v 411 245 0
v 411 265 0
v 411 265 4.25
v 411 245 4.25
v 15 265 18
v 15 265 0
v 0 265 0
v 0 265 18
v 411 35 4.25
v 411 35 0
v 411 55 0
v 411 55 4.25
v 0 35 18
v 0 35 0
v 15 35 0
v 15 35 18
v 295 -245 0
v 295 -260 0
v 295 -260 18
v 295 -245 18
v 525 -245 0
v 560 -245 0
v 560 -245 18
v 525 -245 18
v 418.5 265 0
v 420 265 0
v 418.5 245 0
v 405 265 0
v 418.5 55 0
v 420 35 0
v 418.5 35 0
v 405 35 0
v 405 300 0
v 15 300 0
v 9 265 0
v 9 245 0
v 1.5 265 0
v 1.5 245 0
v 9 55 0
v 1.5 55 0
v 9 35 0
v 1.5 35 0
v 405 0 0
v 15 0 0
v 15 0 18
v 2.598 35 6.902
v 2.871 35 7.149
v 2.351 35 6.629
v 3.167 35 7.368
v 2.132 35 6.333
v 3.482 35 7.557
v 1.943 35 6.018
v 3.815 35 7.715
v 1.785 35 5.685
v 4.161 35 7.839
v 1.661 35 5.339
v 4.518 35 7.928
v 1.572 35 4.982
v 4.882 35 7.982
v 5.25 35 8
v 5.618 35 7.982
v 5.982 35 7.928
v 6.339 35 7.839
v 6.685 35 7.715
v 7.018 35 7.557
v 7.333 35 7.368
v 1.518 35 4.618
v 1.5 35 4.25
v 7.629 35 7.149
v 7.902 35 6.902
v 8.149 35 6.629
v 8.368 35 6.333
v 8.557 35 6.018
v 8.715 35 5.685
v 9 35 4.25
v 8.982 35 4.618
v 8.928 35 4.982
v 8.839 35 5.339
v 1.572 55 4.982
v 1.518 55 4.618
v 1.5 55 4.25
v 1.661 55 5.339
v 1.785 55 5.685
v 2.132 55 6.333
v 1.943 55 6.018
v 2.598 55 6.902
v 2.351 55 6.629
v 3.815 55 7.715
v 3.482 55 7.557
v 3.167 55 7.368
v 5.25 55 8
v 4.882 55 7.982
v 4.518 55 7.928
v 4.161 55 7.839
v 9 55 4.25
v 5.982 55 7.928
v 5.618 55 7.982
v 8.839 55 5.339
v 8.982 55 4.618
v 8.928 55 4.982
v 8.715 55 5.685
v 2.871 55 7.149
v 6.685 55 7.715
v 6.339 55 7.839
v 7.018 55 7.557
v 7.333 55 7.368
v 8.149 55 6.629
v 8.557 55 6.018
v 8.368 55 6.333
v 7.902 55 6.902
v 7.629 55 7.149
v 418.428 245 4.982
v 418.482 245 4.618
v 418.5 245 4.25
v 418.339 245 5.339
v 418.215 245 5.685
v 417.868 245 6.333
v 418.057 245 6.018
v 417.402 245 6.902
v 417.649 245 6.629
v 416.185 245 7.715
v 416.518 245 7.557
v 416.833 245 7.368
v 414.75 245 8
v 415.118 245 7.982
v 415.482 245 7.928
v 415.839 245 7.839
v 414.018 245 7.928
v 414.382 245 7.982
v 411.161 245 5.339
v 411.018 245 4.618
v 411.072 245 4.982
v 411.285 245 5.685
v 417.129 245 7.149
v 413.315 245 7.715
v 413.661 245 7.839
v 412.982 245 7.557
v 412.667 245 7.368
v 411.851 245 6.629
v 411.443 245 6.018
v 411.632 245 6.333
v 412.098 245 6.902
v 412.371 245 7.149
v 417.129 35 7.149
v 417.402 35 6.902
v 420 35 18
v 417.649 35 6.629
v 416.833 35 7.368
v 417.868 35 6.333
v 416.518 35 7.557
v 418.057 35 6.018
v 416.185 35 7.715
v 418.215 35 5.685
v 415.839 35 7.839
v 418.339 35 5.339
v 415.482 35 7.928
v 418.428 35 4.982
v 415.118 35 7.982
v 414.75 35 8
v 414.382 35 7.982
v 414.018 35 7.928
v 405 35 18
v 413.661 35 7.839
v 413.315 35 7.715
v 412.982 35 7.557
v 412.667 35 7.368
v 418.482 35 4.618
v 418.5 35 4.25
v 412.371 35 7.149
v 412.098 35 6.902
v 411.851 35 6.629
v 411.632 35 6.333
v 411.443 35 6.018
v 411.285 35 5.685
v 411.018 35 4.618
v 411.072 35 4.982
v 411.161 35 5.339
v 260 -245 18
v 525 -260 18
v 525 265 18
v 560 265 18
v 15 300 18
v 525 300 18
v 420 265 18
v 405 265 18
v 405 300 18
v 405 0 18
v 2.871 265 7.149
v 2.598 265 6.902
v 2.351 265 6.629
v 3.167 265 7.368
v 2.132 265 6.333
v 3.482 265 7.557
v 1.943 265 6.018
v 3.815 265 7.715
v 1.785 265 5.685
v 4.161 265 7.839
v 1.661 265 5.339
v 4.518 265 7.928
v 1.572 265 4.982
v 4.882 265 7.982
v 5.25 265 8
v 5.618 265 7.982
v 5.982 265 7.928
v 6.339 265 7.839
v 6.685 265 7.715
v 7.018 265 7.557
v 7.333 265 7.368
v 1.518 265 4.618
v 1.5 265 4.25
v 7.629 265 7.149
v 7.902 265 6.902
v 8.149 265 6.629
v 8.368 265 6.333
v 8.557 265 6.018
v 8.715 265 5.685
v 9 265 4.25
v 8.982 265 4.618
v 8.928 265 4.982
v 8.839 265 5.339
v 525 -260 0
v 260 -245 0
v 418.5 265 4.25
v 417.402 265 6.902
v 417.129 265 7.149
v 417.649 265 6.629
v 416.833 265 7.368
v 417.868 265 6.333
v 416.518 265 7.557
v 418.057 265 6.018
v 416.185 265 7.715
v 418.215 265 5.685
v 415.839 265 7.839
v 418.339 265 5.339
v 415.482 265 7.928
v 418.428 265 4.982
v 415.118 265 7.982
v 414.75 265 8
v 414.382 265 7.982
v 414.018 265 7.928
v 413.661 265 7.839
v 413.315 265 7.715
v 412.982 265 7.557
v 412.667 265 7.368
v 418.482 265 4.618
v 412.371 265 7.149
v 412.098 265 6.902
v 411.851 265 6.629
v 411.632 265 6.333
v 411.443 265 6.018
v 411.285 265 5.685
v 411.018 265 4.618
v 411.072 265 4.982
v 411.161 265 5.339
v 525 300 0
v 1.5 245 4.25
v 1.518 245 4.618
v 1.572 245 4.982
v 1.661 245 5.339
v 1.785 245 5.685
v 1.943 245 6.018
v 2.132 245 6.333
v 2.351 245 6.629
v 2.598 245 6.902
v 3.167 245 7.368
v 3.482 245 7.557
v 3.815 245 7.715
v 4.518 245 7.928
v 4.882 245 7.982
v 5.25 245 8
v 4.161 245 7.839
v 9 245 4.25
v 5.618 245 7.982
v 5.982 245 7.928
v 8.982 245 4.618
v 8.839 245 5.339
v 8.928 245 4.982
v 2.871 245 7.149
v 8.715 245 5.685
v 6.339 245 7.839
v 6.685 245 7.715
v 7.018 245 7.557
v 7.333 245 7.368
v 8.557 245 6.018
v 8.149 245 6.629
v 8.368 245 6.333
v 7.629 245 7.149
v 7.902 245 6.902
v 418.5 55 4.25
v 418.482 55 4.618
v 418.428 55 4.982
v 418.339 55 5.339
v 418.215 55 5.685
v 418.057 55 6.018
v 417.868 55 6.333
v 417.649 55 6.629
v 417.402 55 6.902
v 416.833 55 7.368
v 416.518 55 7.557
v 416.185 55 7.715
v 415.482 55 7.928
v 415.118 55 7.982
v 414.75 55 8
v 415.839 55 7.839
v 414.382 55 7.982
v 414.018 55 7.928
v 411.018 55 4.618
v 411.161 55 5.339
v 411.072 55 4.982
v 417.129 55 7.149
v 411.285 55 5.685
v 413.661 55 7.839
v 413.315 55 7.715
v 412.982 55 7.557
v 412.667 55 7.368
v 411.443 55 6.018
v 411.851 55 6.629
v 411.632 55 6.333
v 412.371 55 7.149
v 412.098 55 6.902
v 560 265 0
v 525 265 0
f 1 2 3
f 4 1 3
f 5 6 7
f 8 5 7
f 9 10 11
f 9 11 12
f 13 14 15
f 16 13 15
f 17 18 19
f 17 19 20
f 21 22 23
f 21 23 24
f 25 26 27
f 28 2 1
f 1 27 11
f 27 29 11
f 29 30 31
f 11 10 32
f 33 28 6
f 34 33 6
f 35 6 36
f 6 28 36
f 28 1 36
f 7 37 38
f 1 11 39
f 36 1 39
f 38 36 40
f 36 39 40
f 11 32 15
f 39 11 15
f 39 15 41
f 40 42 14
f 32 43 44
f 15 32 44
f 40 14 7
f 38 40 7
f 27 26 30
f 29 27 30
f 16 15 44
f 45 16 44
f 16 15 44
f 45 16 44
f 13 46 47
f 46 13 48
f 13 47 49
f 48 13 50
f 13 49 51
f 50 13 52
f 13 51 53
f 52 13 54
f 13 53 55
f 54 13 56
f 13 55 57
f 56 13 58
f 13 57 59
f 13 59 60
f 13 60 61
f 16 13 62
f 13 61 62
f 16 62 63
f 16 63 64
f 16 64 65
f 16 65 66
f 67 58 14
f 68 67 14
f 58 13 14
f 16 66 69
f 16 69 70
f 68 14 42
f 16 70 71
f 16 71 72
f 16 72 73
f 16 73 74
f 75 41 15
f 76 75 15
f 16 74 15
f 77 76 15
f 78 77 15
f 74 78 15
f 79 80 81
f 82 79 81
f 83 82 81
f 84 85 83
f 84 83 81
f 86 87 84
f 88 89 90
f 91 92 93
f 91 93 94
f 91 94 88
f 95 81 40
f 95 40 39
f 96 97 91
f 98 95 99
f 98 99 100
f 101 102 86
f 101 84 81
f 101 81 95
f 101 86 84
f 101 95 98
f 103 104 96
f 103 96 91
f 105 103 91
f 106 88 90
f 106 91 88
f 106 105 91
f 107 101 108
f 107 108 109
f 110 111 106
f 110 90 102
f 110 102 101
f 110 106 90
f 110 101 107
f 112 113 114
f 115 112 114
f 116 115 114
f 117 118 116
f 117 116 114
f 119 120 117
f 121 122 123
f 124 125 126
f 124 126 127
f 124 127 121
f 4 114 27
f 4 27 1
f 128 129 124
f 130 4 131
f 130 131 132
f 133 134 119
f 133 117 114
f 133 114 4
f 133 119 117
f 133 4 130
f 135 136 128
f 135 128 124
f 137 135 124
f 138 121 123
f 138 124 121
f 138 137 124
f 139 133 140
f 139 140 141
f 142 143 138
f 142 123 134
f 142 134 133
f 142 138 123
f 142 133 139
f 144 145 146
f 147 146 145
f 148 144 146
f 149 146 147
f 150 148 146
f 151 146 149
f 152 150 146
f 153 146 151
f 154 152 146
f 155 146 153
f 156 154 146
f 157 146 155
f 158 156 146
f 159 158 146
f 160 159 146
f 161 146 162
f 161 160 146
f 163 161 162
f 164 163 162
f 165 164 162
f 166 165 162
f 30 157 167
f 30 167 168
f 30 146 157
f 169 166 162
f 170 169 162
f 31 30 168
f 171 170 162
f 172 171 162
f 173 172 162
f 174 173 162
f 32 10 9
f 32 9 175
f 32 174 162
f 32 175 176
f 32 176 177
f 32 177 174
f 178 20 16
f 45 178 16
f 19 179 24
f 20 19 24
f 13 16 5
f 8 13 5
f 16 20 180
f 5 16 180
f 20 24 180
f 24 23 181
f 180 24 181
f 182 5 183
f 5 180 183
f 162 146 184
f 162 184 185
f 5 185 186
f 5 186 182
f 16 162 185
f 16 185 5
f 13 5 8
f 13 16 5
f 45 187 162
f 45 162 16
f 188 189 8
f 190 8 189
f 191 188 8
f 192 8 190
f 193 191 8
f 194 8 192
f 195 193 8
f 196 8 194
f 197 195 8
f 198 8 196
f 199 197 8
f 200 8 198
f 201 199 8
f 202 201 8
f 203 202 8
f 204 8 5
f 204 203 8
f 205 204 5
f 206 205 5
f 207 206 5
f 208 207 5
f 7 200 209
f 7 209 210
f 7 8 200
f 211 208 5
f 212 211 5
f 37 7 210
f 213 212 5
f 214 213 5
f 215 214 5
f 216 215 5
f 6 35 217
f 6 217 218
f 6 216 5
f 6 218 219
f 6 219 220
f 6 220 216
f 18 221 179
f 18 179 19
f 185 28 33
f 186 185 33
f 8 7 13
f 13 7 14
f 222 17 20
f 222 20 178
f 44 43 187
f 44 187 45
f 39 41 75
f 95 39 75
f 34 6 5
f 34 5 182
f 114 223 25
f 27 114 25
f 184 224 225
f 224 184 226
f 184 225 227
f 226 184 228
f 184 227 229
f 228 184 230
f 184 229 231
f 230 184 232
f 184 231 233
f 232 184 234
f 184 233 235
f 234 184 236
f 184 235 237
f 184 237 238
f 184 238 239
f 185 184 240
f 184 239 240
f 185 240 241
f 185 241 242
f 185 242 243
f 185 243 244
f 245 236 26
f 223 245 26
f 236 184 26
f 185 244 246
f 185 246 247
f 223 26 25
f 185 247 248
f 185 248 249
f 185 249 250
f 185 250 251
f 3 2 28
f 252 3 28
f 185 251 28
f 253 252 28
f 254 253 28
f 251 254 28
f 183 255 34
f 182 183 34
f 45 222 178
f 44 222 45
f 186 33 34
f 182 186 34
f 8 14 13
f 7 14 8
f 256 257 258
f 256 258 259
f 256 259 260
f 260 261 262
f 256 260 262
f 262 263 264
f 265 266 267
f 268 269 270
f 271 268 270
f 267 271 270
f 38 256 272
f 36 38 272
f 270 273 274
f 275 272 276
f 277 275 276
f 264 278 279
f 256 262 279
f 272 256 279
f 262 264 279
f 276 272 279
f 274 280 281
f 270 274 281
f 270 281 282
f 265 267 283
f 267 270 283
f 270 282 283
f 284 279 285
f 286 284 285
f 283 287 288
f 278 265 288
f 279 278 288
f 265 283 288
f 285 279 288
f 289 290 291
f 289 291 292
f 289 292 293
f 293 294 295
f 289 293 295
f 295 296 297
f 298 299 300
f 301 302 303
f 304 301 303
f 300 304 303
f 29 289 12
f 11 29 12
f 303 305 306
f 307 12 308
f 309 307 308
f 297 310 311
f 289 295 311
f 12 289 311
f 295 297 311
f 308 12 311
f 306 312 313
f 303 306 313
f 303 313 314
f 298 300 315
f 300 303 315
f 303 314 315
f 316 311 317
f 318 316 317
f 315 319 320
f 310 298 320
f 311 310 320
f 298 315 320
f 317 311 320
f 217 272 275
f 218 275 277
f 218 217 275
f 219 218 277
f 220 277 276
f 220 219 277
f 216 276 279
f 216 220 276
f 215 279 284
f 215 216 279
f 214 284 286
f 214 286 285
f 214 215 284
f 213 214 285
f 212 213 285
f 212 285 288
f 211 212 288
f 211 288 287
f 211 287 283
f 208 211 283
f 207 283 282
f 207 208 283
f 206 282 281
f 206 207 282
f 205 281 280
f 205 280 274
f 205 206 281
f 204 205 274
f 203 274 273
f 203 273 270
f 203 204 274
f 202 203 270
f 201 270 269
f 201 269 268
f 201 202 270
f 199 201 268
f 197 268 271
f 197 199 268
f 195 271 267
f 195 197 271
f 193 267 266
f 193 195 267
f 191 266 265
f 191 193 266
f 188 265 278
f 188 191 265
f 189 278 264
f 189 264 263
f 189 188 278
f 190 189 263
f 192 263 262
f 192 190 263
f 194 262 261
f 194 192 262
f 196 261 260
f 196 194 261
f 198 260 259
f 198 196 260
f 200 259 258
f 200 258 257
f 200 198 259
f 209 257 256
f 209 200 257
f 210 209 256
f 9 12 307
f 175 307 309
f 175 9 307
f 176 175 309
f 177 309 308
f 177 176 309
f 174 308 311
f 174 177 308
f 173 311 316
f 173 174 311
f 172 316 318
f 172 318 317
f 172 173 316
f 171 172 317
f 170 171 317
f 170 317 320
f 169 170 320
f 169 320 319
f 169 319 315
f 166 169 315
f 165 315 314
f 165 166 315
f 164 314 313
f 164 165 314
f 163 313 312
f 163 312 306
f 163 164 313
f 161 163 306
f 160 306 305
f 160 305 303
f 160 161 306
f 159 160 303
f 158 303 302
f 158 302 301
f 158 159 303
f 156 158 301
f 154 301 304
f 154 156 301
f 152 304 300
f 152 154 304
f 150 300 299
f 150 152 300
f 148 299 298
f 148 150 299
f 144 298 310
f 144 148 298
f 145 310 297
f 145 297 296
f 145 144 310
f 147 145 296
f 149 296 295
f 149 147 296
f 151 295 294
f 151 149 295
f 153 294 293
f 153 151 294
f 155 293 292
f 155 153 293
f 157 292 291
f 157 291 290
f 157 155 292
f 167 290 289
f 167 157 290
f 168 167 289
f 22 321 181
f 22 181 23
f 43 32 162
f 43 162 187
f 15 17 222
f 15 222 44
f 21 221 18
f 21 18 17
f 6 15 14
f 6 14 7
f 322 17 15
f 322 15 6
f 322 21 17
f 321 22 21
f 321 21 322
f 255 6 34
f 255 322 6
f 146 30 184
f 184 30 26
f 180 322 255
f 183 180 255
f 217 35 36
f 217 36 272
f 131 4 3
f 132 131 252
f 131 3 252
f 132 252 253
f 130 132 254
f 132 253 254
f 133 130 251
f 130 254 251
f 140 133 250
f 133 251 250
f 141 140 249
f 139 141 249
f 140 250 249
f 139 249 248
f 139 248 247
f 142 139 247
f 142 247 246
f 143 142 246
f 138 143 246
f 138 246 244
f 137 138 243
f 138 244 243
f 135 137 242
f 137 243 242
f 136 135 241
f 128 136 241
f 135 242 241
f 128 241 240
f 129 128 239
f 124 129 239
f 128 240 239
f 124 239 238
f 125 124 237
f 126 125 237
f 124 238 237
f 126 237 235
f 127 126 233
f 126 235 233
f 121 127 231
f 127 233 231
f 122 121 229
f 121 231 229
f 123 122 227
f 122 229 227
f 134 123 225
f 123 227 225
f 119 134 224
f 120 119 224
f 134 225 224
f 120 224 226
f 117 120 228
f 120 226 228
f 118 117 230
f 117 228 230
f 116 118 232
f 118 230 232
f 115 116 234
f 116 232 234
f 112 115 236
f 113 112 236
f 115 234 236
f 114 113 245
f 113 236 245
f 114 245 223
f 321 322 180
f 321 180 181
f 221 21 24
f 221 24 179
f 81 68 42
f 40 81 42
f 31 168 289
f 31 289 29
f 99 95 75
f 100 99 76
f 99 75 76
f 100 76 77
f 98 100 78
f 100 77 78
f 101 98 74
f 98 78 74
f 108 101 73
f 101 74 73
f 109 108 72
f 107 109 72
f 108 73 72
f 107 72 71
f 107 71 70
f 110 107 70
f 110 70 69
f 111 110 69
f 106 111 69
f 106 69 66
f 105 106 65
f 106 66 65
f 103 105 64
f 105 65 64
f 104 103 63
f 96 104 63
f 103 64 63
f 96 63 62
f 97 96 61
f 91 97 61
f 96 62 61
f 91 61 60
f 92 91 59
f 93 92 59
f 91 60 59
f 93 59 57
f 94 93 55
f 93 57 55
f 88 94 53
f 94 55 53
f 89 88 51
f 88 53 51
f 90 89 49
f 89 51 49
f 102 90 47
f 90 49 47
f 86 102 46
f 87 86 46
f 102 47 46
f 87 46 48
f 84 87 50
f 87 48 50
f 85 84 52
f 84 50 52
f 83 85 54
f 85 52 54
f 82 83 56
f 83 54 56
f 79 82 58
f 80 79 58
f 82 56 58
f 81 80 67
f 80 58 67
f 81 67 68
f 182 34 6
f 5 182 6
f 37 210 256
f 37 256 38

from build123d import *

# Parameters (mm, degrees)
F2_DEPTH = 18
F4_DEPTH = 20
F8_DEPTH = 18


with BuildPart() as f2:
    # F1 (on Top) → F2 (new body)
    with BuildSketch(Plane.XY):
        Polygon((15, 35), (15, 0), (210, 0), (210, 150), (0, 150), (0, 35), align=None)
    extrude(amount=F2_DEPTH)

    # F3 (on face) → F4 (cut)
    with BuildSketch(Plane.XZ.offset(-35)):
        with BuildLine():
            Line((9, 0), (9, 4.25))
            ThreePointArc((9, 4.25), (5.25, 8), (1.5, 4.25))
            Line((1.5, 4.25), (1.5, 0))
            Line((1.5, 0), (9, 0))
        make_face()
    extrude(amount=-F4_DEPTH, mode=Mode.SUBTRACT)

    # F5: F2 across face


with BuildPart() as f2_1:
    add(f2.part)
    add(f2.part.mirror(Plane(origin=(105, 150, 9), x_dir=(-1, 0, 0), z_dir=(0, 1, 0))))

    # F6: F2 across face


with BuildPart() as f2_2:
    add(f2_1.part)
    add(f2_1.part.mirror(Plane(origin=(210, 150, 9), x_dir=(0, 1, 0), z_dir=(1, 0, 0))))


with BuildPart() as f8:
    # F7 (on Top) → F8 (new body)
    with BuildSketch(Plane.XY):
        Polygon((15, 35), (15, 0), (137.5, -122.5), (525, 265), (525, 300), (15, 300), (15, 265), (0, 265), (0, 35), align=None)
    extrude(amount=F8_DEPTH)

    # F9: F8 across face


with BuildPart() as f8_1:
    add(f8.part)
    add(f8.part.mirror(Plane(origin=(331.25, 71.25, 9), x_dir=(0.7071067812, 0.7071067812, 0), z_dir=(0.7071067812, -0.7071067812, 0))))


solid = Compound([f2_2.part, f8_1.part])
